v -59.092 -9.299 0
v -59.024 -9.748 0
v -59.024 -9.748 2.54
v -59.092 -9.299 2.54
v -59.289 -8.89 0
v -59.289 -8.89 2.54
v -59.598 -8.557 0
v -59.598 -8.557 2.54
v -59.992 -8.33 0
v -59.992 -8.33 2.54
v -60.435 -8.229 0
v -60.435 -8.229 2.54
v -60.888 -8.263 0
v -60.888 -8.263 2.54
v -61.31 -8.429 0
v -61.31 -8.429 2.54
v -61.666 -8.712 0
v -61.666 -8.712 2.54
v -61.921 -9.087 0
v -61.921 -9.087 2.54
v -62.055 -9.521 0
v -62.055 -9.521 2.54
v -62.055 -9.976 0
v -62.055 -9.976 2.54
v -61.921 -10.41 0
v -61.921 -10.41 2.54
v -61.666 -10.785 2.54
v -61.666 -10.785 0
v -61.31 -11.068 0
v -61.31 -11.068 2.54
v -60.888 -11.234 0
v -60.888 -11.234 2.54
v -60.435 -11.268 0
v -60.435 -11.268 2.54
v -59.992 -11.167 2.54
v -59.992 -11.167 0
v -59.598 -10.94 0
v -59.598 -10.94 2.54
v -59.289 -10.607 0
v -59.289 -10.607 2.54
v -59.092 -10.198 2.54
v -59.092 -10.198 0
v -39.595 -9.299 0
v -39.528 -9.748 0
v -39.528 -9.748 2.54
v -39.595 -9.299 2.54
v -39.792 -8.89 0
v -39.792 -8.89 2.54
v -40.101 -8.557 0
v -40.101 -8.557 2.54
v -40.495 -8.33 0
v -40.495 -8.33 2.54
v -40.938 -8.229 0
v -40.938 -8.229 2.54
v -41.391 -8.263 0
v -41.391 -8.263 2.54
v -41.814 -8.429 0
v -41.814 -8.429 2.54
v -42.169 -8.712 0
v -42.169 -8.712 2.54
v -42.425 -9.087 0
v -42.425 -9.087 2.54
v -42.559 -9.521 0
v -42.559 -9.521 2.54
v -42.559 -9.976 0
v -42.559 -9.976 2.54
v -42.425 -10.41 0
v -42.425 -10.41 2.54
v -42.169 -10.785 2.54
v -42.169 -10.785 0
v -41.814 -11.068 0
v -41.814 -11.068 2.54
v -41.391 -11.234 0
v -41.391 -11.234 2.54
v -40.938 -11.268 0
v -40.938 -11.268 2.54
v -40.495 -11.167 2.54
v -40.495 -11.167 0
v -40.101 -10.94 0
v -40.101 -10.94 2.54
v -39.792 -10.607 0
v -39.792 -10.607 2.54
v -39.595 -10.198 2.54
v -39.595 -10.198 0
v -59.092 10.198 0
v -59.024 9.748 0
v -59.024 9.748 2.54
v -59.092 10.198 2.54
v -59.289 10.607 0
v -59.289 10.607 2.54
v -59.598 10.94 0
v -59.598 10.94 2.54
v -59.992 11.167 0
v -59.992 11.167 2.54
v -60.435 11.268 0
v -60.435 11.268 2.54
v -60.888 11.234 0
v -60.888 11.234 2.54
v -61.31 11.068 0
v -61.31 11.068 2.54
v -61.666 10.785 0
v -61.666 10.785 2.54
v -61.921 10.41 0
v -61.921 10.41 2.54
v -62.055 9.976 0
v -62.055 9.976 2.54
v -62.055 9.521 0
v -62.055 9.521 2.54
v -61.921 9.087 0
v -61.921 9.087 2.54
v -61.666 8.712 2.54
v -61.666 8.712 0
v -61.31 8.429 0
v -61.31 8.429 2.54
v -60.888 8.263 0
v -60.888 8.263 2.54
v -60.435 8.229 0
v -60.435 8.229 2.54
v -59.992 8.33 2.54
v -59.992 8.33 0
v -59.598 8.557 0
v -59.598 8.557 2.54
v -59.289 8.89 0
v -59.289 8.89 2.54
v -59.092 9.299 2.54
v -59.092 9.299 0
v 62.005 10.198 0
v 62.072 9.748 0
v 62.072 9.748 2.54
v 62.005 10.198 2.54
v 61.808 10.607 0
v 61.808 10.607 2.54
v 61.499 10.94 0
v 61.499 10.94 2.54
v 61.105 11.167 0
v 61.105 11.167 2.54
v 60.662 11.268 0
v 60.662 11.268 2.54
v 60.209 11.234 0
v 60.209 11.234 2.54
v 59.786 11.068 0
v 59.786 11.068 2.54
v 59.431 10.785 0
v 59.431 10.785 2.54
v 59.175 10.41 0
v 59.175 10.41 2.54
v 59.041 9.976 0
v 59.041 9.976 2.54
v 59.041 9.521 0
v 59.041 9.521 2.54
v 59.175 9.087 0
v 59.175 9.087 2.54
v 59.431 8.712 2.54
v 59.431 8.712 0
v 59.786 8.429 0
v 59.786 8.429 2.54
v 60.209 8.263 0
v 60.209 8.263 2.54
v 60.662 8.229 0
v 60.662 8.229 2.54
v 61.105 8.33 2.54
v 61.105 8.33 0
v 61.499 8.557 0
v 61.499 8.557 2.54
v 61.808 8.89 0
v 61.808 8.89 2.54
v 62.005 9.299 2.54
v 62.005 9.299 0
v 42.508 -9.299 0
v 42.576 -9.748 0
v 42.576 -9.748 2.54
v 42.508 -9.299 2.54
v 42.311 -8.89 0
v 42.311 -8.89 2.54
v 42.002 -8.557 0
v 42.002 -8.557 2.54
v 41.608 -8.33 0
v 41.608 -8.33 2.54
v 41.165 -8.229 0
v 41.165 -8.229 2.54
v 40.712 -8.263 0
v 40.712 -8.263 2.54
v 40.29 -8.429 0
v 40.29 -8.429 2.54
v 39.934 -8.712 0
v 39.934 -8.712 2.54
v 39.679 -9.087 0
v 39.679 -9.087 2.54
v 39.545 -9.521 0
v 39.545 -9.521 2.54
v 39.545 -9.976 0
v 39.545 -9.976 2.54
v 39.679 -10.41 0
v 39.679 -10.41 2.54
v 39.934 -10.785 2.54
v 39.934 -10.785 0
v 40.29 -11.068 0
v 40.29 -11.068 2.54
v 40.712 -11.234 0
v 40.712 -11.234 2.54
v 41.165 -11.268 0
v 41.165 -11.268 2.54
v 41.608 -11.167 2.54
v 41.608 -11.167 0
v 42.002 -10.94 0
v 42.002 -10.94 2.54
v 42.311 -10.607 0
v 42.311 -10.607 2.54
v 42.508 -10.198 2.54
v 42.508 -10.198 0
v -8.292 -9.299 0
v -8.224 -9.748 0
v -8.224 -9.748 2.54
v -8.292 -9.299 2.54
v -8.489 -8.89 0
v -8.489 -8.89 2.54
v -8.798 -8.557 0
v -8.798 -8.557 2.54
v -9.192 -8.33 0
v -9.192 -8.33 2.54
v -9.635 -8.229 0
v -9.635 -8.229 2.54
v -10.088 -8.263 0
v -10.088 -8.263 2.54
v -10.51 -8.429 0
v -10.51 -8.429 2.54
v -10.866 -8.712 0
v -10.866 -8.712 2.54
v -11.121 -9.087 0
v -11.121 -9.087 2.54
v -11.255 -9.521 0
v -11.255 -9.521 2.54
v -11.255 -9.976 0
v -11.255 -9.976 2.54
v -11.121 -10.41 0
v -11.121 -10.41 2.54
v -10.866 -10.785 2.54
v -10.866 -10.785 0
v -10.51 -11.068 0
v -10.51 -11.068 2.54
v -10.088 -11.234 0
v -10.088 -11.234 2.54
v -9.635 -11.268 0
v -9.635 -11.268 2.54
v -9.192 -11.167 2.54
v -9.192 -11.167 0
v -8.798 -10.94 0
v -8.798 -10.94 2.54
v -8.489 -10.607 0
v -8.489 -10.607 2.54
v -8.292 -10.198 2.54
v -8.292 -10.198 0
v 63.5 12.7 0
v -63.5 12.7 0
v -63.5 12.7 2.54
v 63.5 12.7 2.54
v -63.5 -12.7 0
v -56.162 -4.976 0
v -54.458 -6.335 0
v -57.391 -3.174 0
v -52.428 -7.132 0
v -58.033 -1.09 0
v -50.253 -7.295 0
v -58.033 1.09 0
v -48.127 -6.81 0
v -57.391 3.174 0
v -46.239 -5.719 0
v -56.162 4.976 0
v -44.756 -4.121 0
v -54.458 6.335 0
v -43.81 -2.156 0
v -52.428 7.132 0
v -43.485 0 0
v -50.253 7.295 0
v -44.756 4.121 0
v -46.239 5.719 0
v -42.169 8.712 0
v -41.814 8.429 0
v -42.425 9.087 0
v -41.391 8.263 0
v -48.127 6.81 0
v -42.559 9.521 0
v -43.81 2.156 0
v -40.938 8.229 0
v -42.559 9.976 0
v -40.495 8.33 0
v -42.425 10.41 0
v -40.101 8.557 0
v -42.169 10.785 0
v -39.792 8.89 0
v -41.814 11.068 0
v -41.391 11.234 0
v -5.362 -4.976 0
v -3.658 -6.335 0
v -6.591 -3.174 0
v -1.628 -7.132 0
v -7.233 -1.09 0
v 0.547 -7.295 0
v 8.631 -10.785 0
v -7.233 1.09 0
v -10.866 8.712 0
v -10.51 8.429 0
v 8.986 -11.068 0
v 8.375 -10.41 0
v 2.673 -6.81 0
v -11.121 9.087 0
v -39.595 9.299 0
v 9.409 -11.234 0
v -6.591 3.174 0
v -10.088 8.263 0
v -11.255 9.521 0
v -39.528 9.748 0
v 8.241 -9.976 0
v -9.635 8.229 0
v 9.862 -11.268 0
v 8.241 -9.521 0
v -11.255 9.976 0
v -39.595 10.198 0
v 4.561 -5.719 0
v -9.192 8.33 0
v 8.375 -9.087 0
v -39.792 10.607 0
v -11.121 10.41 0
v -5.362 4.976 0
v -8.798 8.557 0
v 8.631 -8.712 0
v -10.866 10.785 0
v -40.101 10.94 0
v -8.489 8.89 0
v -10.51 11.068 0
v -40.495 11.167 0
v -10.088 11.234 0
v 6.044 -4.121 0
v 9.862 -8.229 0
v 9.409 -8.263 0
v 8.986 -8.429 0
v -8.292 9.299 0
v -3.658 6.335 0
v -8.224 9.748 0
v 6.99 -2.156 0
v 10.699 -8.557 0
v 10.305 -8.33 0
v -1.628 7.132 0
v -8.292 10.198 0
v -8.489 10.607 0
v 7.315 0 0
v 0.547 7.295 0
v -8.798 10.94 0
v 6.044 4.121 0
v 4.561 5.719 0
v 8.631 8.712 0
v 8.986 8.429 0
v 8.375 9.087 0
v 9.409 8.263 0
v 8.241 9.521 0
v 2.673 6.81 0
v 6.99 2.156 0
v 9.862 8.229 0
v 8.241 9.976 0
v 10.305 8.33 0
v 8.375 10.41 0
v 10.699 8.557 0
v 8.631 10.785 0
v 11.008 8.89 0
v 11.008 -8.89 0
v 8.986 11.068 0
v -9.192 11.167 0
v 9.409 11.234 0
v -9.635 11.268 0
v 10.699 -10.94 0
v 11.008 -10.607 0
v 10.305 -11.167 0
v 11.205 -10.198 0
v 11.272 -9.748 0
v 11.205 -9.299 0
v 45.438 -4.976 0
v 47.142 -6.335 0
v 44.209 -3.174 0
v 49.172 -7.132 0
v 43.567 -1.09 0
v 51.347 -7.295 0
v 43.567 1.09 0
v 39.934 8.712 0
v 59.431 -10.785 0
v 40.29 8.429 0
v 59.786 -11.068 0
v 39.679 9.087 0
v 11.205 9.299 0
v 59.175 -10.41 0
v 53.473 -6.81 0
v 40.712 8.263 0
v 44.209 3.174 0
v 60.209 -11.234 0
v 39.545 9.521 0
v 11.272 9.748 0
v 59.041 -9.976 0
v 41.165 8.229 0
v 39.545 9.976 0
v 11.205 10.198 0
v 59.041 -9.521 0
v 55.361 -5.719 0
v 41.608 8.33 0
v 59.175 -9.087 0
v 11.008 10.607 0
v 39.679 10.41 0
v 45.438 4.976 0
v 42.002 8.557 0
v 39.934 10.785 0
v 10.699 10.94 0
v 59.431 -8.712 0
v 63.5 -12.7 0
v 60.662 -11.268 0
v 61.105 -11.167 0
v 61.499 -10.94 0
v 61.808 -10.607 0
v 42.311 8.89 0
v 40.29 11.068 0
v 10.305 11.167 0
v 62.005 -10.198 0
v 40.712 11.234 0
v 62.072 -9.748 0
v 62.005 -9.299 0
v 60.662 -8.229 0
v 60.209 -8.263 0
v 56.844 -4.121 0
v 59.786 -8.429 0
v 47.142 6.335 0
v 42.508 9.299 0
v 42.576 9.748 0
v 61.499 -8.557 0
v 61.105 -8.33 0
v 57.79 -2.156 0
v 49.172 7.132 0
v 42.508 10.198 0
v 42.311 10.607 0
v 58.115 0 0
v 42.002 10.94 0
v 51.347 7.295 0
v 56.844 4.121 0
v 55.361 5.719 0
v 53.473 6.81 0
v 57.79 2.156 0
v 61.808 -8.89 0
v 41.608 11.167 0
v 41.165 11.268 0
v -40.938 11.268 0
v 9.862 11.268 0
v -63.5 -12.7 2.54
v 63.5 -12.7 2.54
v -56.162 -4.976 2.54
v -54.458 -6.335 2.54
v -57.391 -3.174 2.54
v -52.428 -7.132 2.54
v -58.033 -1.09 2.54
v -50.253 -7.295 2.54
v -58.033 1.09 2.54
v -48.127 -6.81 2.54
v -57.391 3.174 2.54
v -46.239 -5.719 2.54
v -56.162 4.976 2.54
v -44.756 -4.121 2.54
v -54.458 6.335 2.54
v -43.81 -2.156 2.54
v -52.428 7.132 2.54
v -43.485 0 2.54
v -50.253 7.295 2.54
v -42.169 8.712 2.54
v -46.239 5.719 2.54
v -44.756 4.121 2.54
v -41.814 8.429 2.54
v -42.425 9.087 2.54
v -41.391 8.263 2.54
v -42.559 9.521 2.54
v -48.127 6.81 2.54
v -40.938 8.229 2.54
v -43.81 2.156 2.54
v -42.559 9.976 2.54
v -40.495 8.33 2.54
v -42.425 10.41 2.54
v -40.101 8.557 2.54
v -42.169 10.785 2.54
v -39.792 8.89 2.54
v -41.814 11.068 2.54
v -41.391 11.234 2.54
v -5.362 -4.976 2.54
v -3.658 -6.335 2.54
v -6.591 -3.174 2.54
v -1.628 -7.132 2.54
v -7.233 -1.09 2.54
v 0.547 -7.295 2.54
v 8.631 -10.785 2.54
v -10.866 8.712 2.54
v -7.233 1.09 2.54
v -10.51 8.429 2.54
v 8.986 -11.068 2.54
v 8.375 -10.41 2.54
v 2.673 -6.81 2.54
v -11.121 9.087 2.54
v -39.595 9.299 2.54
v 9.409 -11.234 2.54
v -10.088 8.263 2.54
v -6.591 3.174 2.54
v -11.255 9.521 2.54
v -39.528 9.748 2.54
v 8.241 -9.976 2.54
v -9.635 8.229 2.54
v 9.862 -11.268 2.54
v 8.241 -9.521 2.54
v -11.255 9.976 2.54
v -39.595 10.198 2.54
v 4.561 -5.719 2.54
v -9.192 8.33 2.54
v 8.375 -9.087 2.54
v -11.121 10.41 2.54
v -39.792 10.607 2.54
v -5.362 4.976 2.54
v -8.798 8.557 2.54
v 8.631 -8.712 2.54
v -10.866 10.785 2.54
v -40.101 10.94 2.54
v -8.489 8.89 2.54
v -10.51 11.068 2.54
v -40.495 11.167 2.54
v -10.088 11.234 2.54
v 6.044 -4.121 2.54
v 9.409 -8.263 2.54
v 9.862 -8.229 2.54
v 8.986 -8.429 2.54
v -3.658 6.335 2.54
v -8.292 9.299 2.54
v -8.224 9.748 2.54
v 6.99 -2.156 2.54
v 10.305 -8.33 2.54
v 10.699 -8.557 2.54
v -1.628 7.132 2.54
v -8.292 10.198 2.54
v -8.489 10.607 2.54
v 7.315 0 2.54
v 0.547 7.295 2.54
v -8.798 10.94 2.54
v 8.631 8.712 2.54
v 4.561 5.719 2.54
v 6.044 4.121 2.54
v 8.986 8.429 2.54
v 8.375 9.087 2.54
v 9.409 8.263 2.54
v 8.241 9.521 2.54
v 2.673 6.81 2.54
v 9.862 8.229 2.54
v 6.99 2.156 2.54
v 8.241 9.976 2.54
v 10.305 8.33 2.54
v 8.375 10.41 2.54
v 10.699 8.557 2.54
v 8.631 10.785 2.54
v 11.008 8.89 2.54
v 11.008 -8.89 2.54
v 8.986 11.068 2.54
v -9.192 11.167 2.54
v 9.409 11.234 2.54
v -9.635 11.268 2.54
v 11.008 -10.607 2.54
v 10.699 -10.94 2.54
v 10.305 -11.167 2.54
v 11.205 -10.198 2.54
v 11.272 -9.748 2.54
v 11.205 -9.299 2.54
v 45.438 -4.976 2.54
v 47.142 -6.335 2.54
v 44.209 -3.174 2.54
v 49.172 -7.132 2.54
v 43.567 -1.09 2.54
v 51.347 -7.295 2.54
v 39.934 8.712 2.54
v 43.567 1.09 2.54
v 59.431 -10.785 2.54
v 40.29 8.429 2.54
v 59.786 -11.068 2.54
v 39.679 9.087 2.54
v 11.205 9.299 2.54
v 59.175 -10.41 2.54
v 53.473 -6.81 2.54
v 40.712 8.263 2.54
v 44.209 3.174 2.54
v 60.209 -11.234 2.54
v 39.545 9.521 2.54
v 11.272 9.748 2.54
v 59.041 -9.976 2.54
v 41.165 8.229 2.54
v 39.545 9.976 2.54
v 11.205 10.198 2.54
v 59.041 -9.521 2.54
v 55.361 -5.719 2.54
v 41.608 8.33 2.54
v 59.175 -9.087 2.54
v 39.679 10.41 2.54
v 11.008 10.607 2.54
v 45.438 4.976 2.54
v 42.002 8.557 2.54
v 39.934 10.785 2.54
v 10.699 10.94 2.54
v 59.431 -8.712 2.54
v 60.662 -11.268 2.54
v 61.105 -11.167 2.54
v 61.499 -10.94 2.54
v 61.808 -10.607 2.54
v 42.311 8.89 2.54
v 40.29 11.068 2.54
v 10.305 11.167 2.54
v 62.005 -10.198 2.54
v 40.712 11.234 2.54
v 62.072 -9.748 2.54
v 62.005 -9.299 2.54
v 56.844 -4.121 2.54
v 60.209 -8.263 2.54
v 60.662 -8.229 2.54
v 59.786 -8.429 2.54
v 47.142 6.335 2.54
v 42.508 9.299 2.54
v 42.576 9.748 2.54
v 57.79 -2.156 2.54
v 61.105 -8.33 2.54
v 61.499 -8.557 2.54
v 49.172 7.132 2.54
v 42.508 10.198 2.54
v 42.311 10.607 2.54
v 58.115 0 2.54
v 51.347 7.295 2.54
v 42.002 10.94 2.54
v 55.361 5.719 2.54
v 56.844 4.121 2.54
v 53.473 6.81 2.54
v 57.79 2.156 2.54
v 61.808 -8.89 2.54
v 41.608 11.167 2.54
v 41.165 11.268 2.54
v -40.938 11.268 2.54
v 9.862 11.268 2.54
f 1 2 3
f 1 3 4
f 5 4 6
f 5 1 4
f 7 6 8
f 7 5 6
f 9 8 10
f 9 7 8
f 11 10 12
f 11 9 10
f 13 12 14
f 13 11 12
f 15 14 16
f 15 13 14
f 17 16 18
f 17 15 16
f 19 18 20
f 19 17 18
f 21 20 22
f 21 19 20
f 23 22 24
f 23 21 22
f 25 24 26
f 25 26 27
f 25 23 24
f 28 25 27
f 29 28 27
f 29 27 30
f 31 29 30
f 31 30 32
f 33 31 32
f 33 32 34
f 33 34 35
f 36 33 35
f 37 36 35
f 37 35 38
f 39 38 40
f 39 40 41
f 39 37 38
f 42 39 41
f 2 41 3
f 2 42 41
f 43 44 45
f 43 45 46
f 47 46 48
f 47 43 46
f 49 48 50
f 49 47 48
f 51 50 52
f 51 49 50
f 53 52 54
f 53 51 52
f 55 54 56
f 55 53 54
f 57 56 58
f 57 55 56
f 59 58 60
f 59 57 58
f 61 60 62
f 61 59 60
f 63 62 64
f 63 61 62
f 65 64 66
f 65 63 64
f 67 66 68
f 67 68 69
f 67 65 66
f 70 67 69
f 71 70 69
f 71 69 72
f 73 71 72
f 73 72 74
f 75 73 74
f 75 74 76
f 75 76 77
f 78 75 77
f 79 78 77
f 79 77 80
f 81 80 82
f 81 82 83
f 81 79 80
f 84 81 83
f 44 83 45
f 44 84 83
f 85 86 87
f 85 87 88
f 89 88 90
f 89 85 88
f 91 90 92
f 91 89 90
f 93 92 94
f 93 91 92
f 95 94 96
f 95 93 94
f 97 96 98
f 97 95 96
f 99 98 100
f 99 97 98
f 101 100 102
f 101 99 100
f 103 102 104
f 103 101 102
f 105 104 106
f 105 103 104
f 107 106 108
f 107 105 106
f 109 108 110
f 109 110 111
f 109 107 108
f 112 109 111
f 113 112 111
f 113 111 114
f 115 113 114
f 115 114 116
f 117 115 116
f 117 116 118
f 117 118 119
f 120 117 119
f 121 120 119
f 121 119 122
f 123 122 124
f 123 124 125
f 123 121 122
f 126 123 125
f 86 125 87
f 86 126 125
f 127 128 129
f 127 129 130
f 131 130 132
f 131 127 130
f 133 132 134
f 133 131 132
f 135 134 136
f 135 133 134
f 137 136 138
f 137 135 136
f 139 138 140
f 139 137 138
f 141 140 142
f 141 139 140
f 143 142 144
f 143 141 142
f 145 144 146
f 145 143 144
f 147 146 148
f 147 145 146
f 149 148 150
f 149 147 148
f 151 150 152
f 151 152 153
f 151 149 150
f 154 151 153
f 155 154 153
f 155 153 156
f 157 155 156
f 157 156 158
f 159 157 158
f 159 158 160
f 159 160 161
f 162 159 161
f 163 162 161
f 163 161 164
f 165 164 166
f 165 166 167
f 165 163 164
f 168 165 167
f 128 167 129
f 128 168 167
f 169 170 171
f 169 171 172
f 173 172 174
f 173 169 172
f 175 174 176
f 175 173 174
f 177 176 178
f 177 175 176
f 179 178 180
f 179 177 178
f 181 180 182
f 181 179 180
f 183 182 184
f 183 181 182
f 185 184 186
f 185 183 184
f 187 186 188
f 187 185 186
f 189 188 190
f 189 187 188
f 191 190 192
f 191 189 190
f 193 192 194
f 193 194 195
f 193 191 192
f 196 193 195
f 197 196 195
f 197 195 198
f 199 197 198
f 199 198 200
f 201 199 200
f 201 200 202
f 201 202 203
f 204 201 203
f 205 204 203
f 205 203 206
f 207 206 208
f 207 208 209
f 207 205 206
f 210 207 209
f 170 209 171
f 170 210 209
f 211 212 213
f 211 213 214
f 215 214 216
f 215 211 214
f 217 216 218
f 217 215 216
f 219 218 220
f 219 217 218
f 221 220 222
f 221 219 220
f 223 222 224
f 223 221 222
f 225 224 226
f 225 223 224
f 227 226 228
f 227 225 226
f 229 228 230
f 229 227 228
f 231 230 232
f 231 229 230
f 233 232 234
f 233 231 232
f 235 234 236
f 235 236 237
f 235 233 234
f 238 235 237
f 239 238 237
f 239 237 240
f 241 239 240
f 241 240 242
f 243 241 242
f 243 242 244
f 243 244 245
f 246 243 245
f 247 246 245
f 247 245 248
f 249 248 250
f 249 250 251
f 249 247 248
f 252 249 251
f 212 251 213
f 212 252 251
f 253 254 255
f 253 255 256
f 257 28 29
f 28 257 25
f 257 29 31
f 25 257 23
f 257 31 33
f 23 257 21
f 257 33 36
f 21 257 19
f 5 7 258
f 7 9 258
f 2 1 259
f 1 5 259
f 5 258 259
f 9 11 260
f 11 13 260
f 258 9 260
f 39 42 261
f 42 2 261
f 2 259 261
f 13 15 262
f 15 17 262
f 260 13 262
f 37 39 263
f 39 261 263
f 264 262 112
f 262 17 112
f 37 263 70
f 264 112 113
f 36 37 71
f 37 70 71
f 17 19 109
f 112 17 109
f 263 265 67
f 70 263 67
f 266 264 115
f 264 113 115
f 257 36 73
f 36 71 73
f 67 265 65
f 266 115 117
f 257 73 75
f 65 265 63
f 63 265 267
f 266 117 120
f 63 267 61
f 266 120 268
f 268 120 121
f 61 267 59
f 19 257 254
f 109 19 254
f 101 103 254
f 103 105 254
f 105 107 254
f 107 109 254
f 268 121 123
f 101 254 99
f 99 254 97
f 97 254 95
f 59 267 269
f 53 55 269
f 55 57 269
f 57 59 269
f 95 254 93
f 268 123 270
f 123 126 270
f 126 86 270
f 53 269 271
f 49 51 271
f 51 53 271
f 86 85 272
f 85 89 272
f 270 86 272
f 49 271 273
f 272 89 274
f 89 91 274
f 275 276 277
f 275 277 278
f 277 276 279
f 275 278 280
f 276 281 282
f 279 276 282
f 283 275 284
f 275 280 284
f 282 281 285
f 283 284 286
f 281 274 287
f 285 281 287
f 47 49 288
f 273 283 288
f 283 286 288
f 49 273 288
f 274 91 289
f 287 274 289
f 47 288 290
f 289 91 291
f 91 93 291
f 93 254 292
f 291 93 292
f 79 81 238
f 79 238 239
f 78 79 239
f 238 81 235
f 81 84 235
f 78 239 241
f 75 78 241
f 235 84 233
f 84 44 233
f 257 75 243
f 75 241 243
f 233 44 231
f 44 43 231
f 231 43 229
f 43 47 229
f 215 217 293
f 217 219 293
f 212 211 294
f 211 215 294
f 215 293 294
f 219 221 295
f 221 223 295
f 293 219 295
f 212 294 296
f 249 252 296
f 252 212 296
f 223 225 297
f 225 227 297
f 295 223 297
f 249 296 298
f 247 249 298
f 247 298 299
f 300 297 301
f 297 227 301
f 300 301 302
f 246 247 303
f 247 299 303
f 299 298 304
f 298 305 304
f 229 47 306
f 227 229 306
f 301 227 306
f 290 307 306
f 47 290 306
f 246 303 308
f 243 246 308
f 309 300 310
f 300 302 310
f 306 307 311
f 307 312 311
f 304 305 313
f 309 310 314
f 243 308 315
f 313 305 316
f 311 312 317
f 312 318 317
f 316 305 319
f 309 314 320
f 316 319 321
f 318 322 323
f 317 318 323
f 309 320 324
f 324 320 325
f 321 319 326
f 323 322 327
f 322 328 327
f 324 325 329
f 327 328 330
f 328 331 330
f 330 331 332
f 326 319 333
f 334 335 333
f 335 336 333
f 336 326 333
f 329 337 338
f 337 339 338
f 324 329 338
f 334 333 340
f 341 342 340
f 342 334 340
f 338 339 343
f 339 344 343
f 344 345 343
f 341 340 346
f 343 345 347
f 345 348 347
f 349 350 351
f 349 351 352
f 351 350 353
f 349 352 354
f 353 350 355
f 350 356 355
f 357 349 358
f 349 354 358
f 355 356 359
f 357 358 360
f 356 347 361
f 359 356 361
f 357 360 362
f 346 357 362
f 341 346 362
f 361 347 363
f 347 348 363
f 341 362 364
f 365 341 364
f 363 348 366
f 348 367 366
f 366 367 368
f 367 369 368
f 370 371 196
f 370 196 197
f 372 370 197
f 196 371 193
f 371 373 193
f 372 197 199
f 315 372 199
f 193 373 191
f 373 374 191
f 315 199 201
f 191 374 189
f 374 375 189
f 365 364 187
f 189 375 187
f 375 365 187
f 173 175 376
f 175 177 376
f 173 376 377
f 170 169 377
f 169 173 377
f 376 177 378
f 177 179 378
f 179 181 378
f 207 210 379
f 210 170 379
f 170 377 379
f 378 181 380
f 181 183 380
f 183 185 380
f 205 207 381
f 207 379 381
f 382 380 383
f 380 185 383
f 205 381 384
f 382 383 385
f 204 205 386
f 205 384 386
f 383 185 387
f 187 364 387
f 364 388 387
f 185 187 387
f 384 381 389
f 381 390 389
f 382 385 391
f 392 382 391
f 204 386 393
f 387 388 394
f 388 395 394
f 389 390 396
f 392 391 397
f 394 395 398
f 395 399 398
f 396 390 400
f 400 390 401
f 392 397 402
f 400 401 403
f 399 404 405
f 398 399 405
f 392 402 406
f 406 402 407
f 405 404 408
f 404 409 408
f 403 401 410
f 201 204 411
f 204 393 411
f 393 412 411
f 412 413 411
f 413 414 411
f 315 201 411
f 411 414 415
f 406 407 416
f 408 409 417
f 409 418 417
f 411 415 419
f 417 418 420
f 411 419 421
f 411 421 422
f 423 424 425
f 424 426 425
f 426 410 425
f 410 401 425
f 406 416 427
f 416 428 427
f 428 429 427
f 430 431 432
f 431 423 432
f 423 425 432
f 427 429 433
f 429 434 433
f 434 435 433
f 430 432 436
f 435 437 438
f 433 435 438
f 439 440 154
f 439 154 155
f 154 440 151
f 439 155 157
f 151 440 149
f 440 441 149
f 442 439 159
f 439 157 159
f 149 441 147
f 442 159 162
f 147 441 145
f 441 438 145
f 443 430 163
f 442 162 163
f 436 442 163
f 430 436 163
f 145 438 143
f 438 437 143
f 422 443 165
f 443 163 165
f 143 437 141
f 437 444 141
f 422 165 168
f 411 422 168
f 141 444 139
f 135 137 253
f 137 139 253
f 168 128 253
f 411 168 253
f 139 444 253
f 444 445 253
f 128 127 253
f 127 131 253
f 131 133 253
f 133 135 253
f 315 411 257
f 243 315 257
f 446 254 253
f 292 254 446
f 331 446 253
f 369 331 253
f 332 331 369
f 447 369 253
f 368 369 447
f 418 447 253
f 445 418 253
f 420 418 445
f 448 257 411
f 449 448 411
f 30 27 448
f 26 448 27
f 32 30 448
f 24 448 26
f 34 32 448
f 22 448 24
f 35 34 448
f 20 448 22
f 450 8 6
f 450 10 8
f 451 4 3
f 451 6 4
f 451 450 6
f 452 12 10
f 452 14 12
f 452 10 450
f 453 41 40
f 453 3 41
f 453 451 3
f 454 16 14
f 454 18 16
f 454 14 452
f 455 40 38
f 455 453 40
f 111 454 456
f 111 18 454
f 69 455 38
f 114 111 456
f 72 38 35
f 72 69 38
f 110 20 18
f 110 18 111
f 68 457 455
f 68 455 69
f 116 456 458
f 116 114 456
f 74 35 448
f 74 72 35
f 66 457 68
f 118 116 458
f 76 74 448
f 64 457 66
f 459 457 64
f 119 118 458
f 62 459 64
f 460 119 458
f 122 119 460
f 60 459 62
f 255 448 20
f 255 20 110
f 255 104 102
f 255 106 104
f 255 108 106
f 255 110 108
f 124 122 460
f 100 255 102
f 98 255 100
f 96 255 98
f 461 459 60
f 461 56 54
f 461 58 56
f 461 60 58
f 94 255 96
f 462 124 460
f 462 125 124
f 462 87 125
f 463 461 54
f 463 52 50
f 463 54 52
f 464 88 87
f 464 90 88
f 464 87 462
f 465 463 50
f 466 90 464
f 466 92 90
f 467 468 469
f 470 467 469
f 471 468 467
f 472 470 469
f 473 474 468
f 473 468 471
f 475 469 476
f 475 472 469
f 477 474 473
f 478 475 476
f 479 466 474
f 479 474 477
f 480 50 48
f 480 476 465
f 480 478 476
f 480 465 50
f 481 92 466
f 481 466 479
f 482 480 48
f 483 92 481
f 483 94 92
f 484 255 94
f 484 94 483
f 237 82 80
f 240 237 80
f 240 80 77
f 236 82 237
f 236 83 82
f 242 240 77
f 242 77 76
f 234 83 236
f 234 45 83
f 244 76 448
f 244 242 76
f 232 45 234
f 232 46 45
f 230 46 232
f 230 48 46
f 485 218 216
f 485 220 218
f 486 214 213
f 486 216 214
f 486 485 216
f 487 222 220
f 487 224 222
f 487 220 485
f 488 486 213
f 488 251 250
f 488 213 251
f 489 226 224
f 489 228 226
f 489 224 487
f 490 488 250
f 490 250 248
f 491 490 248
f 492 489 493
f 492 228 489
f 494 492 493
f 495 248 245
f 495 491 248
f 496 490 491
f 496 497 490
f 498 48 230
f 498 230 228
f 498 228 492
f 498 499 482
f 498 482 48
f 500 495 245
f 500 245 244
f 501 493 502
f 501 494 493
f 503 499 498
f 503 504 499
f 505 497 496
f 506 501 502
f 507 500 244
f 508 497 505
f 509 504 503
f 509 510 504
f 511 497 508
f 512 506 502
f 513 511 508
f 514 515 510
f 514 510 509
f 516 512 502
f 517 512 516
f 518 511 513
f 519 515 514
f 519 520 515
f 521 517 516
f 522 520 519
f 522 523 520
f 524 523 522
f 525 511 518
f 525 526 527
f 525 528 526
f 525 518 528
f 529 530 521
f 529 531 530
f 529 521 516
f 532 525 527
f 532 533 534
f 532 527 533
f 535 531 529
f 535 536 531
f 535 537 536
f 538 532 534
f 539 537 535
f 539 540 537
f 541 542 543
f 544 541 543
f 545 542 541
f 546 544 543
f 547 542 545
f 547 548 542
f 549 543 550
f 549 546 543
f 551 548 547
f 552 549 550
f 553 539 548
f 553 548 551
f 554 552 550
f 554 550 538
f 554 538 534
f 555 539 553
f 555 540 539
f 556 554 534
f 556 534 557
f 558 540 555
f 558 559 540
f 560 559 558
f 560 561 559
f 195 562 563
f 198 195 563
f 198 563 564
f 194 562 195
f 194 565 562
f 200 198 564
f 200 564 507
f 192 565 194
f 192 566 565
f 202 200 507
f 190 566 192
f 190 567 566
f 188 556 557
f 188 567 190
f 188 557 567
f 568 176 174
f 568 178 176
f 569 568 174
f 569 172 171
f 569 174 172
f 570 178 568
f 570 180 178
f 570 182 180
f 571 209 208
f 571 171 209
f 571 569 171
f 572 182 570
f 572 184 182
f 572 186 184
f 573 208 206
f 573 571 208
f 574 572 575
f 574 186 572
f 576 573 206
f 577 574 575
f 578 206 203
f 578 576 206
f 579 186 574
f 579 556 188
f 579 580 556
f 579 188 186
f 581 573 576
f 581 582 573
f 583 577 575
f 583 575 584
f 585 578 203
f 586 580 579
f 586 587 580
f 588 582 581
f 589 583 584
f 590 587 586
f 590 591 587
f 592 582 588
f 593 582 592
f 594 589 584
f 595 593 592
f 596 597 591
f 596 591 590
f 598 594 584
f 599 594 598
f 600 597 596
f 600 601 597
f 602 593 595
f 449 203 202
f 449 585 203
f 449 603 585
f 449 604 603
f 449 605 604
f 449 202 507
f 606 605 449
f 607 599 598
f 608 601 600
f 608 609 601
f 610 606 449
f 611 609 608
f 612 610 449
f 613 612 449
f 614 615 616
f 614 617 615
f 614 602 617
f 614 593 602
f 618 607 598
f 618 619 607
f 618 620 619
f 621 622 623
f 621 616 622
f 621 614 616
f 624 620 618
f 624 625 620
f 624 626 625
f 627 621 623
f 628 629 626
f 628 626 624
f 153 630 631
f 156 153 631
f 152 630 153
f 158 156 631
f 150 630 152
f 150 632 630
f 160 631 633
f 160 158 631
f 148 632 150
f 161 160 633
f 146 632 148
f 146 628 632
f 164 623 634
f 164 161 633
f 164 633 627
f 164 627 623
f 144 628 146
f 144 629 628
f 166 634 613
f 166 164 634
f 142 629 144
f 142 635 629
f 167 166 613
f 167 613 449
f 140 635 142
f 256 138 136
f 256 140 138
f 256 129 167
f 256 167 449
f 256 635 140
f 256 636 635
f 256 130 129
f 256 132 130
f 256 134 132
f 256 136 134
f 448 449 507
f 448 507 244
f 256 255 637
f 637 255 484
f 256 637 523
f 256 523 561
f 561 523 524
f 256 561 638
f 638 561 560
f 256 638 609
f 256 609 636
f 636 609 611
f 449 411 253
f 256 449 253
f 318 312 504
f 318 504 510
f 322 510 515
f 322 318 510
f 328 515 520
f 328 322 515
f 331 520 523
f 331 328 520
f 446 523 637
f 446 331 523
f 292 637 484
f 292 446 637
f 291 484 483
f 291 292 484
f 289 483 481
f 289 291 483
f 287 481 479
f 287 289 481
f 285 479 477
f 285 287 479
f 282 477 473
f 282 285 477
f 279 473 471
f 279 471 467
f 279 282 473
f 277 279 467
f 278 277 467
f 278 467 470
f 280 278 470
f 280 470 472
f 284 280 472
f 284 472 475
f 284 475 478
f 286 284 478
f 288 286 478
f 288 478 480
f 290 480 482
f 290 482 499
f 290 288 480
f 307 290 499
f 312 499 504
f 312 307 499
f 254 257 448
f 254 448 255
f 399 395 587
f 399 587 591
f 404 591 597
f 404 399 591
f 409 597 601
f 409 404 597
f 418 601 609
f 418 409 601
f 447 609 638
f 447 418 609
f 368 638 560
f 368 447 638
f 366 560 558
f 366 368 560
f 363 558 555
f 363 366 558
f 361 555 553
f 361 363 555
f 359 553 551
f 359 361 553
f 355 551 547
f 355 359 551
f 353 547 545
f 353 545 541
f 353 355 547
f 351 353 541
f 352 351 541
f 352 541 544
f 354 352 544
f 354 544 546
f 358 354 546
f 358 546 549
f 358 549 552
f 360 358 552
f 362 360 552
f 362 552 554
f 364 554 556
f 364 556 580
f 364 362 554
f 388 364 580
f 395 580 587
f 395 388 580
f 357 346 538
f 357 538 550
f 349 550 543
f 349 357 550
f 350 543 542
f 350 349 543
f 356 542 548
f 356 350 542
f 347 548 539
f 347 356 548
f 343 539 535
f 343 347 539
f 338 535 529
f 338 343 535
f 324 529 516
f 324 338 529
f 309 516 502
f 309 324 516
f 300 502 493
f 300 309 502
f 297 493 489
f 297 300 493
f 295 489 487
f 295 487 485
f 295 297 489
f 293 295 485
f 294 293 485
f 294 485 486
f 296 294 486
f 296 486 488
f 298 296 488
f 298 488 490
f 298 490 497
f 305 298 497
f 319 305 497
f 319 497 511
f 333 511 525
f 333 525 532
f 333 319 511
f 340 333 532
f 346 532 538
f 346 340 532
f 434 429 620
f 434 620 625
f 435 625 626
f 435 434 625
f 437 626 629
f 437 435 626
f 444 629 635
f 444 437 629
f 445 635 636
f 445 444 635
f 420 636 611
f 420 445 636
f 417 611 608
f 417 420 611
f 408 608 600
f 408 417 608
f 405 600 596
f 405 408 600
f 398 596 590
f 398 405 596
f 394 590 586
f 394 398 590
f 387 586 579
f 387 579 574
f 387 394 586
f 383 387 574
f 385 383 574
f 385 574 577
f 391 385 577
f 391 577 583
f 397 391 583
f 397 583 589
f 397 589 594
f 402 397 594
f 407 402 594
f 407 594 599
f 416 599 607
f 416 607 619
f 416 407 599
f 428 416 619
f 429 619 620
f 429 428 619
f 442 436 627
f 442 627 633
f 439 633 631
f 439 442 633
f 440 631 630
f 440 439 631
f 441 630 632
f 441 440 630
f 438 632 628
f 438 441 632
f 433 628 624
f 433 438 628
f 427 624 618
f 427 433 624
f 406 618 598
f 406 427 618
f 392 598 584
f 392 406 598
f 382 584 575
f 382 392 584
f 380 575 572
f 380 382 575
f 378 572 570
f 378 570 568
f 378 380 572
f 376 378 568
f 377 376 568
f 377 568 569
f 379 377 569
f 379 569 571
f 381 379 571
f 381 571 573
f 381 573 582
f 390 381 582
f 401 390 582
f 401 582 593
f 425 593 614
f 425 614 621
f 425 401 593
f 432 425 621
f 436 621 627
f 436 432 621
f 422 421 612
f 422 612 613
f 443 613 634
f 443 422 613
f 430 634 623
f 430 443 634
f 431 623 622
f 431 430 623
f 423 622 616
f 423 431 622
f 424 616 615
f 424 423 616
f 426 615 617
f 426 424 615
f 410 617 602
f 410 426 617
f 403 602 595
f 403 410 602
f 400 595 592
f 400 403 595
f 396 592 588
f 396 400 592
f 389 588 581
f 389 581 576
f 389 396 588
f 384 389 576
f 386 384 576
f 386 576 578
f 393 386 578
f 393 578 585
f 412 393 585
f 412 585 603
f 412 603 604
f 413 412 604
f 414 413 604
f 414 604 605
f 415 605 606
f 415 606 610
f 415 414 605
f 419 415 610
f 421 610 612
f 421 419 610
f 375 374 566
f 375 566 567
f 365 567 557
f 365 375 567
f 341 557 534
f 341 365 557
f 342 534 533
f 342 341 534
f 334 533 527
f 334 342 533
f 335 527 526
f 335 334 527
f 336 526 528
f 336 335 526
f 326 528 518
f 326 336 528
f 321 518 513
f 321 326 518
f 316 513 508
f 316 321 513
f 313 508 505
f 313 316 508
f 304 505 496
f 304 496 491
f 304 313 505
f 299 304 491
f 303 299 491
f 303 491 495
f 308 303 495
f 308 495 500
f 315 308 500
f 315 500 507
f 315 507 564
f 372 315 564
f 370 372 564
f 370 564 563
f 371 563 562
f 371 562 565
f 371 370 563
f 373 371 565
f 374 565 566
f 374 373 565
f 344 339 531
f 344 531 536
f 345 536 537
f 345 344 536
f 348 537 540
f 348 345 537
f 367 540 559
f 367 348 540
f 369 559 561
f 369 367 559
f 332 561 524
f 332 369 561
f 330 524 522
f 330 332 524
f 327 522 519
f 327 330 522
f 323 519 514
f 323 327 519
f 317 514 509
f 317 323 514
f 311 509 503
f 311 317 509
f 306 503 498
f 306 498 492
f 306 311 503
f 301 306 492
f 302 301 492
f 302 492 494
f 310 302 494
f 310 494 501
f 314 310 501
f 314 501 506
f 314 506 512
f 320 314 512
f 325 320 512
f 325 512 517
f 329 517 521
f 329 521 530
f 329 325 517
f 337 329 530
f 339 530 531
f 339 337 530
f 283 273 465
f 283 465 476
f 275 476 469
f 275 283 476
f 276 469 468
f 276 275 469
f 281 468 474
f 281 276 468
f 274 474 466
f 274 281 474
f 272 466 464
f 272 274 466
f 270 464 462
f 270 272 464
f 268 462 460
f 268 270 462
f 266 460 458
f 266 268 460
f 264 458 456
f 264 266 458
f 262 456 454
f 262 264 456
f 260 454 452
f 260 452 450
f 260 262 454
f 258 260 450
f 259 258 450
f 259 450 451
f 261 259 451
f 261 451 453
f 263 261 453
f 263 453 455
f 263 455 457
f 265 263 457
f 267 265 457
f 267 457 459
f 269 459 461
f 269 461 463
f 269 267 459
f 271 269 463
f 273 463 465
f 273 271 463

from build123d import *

# Parameters (mm, degrees)
SKETCH1_W           = 127
SKETCH1_H           = 25.4
SKETCH1_R           = 7.3152
SKETCH1_R_2         = 1.524
BOSS_EXTRUDE7_DEPTH = 2.54


with BuildPart() as part:
    # Sketch1 → Boss-Extrude7 (new body)
    with BuildSketch(Plane.XY):
        Rectangle(SKETCH1_W, SKETCH1_H)
        Circle(SKETCH1_R, mode=Mode.SUBTRACT)
        with Locations((9.748400853, 9.748400853)):
            Circle(SKETCH1_R_2, mode=Mode.SUBTRACT)
        with Locations((-9.748400853, -9.748400853)):
            Circle(SKETCH1_R_2, mode=Mode.SUBTRACT)
        with Locations((9.748400853, -9.748400853)):
            Circle(SKETCH1_R_2, mode=Mode.SUBTRACT)
        with Locations((-9.748400853, 9.748400853)):
            Circle(SKETCH1_R_2, mode=Mode.SUBTRACT)
        with Locations((50.8, 0)):
            Circle(SKETCH1_R, mode=Mode.SUBTRACT)
        with Locations((60.548400853, 9.748400853)):
            Circle(SKETCH1_R_2, mode=Mode.SUBTRACT)
        with Locations((41.051599147, -9.748400853)):
            Circle(SKETCH1_R_2, mode=Mode.SUBTRACT)
        with Locations((60.548400853, -9.748400853)):
            Circle(SKETCH1_R_2, mode=Mode.SUBTRACT)
        with Locations((41.051599147, 9.748400853)):
            Circle(SKETCH1_R_2, mode=Mode.SUBTRACT)
        with Locations((-50.8, 0)):
            Circle(SKETCH1_R, mode=Mode.SUBTRACT)
        with Locations((-41.051599147, 9.748400853)):
            Circle(SKETCH1_R_2, mode=Mode.SUBTRACT)
        with Locations((-60.548400853, -9.748400853)):
            Circle(SKETCH1_R_2, mode=Mode.SUBTRACT)
        with Locations((-41.051599147, -9.748400853)):
            Circle(SKETCH1_R_2, mode=Mode.SUBTRACT)
        with Locations((-60.548400853, 9.748400853)):
            Circle(SKETCH1_R_2, mode=Mode.SUBTRACT)
    extrude(amount=BOSS_EXTRUDE7_DEPTH)


solid = part.part
